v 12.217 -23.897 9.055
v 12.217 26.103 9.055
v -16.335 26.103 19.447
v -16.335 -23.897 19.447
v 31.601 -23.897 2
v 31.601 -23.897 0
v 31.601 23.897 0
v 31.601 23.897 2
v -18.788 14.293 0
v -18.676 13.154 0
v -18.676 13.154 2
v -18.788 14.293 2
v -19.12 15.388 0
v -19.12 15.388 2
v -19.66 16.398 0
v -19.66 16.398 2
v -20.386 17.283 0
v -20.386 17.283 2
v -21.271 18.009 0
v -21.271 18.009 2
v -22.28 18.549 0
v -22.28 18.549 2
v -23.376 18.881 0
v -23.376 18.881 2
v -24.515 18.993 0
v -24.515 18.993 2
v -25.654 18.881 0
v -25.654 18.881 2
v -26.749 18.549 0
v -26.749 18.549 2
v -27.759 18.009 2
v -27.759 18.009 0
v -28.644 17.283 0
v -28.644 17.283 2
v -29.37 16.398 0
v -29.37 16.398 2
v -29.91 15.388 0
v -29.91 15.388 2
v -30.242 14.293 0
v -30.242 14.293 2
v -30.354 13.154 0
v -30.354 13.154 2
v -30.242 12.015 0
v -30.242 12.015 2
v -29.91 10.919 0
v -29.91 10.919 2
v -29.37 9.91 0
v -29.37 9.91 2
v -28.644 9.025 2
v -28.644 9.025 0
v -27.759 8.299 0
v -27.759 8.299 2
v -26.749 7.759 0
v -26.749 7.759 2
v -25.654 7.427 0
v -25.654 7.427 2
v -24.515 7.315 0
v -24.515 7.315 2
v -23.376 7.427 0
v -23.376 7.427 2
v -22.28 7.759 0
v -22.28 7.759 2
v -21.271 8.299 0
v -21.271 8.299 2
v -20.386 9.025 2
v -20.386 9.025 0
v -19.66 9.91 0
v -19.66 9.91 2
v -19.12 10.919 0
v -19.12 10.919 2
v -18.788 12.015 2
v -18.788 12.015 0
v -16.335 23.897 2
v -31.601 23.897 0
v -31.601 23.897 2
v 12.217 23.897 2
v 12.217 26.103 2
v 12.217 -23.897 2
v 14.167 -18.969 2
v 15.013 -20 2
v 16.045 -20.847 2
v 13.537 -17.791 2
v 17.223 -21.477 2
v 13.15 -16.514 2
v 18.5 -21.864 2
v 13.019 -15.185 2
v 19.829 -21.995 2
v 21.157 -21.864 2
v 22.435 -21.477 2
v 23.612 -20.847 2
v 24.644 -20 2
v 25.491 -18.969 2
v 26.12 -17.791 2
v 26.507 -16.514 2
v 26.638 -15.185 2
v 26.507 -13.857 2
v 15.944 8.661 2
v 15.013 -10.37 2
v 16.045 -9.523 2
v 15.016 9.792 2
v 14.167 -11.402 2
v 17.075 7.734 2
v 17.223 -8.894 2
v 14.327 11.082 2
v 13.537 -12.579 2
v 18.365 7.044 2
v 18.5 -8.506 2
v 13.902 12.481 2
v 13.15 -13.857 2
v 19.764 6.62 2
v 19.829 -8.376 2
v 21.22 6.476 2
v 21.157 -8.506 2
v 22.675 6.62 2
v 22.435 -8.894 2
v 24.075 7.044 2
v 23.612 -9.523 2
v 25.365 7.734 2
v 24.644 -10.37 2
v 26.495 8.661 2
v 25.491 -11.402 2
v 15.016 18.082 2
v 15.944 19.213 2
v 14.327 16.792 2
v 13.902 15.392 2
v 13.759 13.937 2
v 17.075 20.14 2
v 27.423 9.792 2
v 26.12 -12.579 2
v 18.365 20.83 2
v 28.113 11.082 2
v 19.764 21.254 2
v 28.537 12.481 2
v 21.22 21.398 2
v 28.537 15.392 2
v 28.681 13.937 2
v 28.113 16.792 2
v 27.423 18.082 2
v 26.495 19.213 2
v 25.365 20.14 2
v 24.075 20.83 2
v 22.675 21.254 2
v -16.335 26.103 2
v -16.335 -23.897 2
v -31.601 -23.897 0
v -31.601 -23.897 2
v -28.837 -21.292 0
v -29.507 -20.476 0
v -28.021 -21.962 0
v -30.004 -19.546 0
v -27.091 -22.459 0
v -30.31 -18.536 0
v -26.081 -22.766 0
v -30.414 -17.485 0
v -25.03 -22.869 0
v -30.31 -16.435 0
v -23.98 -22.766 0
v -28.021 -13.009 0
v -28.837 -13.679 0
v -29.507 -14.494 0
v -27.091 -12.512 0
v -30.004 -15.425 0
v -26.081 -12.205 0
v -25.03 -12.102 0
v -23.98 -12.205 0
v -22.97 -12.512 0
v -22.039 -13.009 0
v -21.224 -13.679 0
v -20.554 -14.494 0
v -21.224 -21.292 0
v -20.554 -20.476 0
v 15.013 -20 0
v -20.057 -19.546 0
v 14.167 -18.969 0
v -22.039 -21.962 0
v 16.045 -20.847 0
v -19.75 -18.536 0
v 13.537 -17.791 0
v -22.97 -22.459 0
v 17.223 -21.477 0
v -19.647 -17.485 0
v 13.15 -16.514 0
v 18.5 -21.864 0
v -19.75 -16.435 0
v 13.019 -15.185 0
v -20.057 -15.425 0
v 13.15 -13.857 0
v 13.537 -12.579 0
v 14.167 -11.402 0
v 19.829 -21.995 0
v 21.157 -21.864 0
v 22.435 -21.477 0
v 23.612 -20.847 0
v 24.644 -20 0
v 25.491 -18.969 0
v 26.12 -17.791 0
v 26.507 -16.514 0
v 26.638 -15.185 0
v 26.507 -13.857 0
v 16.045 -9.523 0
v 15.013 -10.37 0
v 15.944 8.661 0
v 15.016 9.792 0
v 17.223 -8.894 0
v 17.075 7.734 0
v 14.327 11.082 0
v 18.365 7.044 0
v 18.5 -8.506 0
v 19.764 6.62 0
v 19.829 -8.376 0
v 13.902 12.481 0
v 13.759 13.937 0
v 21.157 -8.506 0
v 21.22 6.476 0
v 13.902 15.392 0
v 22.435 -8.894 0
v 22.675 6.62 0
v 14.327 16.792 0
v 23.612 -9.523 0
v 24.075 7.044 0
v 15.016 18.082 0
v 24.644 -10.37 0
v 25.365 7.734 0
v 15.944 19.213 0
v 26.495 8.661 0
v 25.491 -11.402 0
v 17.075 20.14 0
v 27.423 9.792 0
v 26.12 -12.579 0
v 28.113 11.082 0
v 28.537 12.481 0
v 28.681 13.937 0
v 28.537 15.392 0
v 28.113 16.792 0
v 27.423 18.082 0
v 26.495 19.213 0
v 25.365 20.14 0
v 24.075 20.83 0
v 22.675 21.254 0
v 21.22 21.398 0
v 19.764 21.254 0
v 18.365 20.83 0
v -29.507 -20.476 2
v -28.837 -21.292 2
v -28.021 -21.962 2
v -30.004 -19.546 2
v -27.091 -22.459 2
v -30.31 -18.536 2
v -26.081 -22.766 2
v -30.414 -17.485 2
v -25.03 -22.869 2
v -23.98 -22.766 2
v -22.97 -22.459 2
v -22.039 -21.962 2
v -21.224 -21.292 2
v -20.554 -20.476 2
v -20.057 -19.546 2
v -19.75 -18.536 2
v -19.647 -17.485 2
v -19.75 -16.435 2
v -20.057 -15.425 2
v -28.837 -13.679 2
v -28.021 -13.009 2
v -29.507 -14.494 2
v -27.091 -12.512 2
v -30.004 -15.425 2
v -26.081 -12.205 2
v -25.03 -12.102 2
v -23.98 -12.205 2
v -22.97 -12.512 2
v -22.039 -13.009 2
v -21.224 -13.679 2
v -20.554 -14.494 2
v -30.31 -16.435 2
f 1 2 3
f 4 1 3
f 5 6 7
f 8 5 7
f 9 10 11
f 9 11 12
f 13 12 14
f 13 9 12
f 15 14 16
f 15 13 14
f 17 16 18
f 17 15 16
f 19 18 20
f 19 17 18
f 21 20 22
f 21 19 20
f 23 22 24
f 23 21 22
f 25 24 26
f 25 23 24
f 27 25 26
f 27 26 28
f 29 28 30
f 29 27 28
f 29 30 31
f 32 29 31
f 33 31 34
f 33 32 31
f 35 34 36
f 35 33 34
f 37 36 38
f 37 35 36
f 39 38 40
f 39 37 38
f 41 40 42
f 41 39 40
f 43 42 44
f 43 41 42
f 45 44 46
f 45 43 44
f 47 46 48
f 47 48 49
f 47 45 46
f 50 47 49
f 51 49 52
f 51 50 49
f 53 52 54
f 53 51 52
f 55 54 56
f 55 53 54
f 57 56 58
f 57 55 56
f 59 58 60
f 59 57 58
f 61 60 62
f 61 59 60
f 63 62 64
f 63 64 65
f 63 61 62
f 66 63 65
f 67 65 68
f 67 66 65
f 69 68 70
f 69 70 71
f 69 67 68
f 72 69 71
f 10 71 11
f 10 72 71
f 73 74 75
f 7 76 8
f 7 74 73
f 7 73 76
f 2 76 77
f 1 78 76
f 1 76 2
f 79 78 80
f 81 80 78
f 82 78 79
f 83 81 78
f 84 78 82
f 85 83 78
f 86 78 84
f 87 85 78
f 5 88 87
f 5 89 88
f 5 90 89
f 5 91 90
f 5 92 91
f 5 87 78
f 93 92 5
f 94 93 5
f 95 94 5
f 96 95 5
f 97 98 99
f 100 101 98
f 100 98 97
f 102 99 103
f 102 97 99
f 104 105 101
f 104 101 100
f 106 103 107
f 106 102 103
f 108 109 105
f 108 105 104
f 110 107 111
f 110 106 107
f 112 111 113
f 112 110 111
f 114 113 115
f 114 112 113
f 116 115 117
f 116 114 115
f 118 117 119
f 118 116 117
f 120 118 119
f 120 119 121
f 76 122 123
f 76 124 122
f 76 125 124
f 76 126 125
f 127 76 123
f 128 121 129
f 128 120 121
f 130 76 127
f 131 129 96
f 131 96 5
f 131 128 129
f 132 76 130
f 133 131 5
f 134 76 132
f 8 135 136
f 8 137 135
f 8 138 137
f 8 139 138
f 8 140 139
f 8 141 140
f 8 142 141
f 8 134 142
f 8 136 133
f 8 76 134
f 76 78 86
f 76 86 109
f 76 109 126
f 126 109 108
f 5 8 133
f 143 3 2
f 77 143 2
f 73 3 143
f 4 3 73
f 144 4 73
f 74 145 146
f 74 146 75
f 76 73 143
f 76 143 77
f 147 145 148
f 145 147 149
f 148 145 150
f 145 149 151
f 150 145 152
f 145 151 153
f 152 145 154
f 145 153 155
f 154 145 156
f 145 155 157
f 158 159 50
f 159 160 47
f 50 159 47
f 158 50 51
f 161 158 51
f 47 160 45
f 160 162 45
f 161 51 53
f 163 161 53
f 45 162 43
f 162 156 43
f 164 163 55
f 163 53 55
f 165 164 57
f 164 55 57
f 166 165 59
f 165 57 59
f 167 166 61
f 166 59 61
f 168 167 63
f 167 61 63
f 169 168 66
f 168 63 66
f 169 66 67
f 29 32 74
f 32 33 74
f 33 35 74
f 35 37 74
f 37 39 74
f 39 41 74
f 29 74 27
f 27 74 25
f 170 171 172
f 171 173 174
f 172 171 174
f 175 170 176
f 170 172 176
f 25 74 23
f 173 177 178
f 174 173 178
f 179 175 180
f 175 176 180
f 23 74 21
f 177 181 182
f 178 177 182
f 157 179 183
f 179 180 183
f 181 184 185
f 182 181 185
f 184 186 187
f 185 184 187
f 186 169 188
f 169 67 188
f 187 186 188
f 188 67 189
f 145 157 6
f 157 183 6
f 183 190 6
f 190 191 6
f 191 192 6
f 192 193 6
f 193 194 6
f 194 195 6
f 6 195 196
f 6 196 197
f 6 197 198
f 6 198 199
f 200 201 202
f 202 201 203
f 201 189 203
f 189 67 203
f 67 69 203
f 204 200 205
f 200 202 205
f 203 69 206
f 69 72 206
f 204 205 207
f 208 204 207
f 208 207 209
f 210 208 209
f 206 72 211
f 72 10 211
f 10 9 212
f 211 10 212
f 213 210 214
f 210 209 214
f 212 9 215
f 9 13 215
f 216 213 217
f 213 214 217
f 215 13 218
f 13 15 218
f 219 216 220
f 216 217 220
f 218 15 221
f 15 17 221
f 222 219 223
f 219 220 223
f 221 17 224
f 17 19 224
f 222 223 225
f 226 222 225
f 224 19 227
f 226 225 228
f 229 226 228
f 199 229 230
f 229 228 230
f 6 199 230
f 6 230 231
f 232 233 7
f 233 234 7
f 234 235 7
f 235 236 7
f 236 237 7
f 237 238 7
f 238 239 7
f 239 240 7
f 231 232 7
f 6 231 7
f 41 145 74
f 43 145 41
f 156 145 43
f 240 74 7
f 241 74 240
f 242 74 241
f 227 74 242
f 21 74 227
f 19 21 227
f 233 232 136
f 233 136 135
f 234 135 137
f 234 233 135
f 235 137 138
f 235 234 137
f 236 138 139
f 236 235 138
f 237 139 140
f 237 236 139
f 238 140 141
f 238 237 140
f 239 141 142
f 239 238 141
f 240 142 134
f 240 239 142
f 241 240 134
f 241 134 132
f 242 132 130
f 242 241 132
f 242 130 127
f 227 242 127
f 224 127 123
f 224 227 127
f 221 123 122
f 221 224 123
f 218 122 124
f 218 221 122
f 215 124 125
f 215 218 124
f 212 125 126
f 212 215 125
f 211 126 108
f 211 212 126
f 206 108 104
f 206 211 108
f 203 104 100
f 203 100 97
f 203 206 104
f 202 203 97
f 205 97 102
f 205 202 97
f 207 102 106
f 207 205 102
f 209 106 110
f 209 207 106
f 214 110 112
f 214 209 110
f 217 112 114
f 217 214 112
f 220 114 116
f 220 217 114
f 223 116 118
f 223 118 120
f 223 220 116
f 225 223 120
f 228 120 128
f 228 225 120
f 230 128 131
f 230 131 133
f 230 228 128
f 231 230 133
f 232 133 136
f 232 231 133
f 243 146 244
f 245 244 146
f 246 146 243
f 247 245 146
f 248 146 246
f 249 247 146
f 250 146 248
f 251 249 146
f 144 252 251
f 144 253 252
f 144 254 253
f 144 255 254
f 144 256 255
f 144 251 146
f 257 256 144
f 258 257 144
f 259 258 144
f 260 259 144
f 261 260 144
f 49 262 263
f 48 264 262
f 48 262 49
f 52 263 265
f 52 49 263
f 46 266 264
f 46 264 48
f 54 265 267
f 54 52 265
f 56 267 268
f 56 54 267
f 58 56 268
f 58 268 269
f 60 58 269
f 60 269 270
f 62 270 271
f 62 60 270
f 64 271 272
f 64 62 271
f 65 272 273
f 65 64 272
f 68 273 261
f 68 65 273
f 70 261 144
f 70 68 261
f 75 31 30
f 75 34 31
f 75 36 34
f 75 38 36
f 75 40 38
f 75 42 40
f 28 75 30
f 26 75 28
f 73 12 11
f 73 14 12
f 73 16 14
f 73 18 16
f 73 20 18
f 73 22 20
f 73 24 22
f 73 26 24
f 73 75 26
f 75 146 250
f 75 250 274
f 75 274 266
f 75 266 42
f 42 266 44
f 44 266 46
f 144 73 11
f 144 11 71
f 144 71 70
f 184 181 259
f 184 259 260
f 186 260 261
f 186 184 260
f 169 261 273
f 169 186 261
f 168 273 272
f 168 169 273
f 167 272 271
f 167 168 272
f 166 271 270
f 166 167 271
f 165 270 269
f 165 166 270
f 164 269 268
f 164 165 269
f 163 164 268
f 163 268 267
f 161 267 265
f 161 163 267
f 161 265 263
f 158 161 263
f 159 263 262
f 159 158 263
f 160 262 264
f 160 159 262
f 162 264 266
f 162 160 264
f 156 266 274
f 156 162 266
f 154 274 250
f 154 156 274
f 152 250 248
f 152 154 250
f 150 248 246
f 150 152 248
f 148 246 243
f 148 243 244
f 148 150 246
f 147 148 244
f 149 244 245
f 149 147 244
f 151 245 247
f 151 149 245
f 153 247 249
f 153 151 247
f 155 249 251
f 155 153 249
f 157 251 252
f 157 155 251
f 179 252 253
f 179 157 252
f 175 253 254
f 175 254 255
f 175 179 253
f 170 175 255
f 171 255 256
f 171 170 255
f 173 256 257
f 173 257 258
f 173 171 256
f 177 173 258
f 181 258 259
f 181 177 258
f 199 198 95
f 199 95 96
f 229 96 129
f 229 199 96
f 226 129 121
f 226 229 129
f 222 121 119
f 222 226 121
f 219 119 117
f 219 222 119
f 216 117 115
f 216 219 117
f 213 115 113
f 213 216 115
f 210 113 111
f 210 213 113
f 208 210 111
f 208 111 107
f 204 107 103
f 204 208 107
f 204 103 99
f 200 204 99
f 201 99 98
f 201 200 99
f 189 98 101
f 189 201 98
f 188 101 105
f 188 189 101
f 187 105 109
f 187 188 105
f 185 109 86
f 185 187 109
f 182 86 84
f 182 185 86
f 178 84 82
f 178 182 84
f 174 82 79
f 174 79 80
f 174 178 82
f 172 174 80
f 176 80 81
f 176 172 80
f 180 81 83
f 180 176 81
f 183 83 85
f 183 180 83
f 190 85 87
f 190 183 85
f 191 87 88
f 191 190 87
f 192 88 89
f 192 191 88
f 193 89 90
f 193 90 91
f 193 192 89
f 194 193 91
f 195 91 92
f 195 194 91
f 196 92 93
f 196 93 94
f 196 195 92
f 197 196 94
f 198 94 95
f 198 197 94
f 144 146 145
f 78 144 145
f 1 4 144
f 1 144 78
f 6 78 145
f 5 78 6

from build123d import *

# Parameters (mm, degrees)
F0_W     = 63.20139
F0_H     = 47.793298
F0_R     = 5.383544
F0_R_2   = 6.809705
F0_R_3   = 5.839267
F0_R_4   = 7.460797
F1_DEPTH = 2
F3_DEPTH = 50


with BuildPart() as f1:
    # F0 (on Top) → F1 (new body)
    with BuildSketch(Plane.XY):
        Rectangle(F0_W, F0_H)
        with Locations((-25.030309, -17.485425)):
            Circle(F0_R, mode=Mode.SUBTRACT)
        with Locations((19.828575, -15.185272)):
            Circle(F0_R_2, mode=Mode.SUBTRACT)
        with Locations((-24.514884, 13.153892)):
            Circle(F0_R_3, mode=Mode.SUBTRACT)
        with Locations((21.219891, 13.936961)):
            Circle(F0_R_4, mode=Mode.SUBTRACT)
    extrude(amount=F1_DEPTH)

    # F2 (on face) → F3 (join)
    with BuildSketch(Plane.XZ.offset(23.896649)):
        Polygon((12.217186, 2), (12.217186, 9.05502), (-16.335363, 19.447298), (-16.335363, 2), align=None)
    extrude(amount=-F3_DEPTH)


solid = f1.part
